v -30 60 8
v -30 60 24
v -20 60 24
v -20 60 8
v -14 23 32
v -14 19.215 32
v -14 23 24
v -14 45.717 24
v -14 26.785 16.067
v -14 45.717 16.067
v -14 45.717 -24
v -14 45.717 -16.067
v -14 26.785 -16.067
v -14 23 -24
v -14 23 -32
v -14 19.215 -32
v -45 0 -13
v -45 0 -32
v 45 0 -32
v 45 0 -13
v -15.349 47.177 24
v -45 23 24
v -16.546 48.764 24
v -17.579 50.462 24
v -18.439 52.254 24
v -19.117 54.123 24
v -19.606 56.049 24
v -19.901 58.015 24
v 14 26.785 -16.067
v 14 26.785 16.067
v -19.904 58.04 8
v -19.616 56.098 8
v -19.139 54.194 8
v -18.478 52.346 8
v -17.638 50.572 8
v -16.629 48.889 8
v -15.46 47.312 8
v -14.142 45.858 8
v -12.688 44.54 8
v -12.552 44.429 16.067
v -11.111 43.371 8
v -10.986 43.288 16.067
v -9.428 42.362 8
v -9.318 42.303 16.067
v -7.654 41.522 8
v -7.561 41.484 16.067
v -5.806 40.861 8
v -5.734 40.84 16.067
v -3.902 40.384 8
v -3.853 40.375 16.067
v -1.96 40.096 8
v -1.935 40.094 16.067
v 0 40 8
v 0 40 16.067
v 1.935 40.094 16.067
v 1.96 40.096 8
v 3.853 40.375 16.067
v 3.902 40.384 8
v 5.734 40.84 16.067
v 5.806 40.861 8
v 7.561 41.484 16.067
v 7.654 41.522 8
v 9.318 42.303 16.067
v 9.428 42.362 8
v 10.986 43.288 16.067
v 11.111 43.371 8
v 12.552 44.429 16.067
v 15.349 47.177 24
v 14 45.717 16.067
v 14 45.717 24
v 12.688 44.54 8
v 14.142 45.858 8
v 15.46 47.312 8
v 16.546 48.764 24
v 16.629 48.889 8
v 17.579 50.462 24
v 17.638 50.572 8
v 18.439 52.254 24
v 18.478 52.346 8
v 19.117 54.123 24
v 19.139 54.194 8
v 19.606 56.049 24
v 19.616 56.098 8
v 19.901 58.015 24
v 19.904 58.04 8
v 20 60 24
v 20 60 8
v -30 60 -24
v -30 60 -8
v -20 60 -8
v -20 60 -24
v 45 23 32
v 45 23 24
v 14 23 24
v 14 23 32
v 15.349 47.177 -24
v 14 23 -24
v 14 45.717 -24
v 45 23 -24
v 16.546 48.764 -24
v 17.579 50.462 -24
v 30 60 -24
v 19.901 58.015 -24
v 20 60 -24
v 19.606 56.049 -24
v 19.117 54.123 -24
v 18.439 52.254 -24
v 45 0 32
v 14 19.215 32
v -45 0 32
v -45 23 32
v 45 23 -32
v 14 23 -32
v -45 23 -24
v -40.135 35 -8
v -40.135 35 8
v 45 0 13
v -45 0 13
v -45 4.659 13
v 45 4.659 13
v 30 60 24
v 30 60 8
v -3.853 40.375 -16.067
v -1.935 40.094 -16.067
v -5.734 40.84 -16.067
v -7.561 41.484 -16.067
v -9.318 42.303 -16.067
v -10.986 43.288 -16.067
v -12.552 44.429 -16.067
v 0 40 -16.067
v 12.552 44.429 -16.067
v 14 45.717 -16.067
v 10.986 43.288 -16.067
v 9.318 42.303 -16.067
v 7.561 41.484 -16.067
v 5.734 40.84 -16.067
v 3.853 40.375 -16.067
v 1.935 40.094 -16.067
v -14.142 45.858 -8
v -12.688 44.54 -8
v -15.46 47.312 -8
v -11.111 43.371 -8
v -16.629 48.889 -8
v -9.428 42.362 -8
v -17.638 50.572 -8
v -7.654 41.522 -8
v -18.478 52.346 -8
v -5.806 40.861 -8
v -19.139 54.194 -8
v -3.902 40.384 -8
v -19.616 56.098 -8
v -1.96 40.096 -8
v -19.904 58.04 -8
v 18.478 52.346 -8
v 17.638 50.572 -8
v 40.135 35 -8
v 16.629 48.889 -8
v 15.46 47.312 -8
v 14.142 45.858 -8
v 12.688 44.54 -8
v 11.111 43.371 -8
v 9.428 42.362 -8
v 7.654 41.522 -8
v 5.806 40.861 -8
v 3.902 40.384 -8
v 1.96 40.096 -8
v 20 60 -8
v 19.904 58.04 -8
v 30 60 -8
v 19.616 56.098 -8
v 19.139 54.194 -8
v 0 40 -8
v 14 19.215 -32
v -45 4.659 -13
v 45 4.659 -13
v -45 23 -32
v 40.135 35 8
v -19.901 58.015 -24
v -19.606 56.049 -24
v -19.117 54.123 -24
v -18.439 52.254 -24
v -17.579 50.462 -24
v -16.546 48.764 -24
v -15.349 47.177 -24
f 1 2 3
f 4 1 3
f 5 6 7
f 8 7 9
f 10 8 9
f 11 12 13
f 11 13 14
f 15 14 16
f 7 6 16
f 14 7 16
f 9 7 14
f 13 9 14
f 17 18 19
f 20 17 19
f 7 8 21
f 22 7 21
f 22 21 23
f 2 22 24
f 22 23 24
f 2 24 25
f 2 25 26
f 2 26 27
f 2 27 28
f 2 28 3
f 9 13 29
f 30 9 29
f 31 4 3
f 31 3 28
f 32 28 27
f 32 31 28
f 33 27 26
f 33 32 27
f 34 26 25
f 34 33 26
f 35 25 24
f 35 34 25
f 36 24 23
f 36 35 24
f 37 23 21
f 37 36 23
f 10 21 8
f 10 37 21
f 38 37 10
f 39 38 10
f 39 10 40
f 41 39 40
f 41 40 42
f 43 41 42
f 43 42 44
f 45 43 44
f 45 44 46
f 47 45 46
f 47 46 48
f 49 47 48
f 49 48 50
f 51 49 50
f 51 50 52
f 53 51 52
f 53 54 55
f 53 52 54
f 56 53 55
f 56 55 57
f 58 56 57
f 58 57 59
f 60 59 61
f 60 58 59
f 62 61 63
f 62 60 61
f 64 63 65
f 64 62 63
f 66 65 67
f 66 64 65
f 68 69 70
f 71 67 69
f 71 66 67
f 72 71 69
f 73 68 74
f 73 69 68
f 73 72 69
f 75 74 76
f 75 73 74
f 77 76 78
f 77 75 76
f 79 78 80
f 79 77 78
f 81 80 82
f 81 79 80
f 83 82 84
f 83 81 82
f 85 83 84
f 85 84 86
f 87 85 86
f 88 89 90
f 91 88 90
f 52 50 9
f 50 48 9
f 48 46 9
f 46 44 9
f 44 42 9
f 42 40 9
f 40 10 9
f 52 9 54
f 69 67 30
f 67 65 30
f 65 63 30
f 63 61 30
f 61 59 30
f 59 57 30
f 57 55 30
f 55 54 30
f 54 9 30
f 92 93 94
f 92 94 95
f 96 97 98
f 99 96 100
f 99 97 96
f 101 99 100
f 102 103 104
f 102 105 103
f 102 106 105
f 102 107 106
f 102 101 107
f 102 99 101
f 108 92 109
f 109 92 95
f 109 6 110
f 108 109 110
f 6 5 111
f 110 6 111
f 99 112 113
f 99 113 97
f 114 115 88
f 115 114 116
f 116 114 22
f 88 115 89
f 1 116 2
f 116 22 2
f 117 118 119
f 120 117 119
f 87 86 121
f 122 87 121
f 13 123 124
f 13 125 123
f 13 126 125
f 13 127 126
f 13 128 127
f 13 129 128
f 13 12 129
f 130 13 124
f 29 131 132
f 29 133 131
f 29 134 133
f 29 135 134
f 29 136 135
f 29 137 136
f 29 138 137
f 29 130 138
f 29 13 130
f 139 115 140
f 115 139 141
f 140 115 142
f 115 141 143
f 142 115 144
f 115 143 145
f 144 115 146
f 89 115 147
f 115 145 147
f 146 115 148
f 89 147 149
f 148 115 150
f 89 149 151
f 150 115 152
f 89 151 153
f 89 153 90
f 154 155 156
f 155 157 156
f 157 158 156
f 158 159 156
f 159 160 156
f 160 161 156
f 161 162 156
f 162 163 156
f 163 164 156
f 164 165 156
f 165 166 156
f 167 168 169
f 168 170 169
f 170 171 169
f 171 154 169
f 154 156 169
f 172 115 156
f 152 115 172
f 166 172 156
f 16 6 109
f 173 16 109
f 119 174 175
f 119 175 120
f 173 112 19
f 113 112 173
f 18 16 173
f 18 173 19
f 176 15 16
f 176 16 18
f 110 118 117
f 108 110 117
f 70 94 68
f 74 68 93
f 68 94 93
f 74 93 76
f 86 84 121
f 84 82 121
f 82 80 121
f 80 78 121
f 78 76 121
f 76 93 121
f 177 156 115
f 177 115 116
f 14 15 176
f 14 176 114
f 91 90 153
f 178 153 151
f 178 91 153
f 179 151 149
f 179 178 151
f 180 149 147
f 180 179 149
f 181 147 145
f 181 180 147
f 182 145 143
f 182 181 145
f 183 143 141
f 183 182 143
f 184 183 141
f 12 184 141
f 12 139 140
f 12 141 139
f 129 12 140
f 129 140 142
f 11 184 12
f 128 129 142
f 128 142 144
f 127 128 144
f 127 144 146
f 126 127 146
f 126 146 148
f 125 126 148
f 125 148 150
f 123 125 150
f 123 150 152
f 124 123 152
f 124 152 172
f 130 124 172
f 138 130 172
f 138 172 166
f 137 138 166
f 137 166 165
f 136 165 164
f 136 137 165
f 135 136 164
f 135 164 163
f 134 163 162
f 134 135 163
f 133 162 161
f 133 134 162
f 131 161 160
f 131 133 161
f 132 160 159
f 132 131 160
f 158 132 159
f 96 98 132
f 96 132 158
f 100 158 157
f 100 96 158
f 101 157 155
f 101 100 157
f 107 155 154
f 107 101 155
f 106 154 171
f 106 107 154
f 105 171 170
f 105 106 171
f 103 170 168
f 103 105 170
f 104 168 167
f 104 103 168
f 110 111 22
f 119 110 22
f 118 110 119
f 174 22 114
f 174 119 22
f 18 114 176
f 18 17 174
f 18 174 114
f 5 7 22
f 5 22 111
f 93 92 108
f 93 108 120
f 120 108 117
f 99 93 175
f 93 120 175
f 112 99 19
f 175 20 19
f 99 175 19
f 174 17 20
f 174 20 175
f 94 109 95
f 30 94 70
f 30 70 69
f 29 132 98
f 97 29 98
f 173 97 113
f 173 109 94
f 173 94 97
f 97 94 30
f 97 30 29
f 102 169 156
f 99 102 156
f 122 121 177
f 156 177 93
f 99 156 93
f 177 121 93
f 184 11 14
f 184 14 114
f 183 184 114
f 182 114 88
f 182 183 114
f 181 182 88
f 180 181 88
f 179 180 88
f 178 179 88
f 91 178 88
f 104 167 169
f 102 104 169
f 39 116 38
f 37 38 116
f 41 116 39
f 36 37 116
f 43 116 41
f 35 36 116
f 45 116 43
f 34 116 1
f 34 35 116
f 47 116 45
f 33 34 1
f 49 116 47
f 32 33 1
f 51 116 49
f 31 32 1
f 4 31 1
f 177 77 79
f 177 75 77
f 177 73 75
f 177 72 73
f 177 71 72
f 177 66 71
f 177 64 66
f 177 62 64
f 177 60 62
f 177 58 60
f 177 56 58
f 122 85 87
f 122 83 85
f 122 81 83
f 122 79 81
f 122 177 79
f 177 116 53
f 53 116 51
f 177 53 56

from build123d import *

# Parameters (mm, degrees)
SKETCH1_W               = 90
SKETCH1_H               = 64
BOSS_EXTRUDE1_DEPTH     = 23
SKETCH3_W               = 26
SKETCH3_H               = 9.317565448
CUT_EXTRUDE1_DEPTH      = 99.249681933
SKETCH4_W               = 28
SKETCH4_H               = 7.570604484
CUT_EXTRUDE2_DEPTH      = 82.547532152
BOSS_EXTRUDE2_DEPTH     = 64
CUT_EXTRUDE3_DEPTH      = 113.800709218
CUT_EXTRUDE3_DEPTH_BACK = 113.800709218
SKETCH7_W               = 8
SKETCH7_H               = 37
CUT_EXTRUDE4_DEPTH      = 113.800709218
CUT_EXTRUDE4_DEPTH_BACK = 113.800709218
SKETCH8_W               = 16
SKETCH8_H               = 25
CUT_EXTRUDE5_DEPTH      = 94.600213675
CUT_EXTRUDE5_DEPTH_BACK = 94.600213675
SKETCH9_R               = 20
SKETCH11_W              = 28
SKETCH11_H              = 15.933340455
CUT_EXTRUDE6_DEPTH      = 69.647220475


with BuildPart() as part:
    # Sketch1 → Boss-Extrude1 (new body)
    with BuildSketch(Plane(origin=(0, 0, 0), x_dir=(1, 0, 0), z_dir=(0, 1, 0))):
        Rectangle(SKETCH1_W, SKETCH1_H)
    extrude(amount=BOSS_EXTRUDE1_DEPTH)

    # Sketch3 → Cut-Extrude1 (cut, through all)
    with BuildSketch(Plane.ZY.offset(45)):
        Rectangle(SKETCH3_W, SKETCH3_H)
    extrude(amount=-CUT_EXTRUDE1_DEPTH, mode=Mode.SUBTRACT)

    # Sketch4 → Cut-Extrude2 (cut, through all)
    with BuildSketch(Plane.XY.offset(32)):
        with Locations((0, 23)):
            Rectangle(SKETCH4_W, SKETCH4_H)
    cut_extrude2 = extrude(amount=-CUT_EXTRUDE2_DEPTH, mode=Mode.SUBTRACT)

    # Sketch5 → Boss-Extrude2 (add, through all)
    with BuildSketch(Plane.XY.offset(32)):
        Polygon((-30, 60), (30, 60), (45, 23), (-45, 23), align=None)
    extrude(amount=-BOSS_EXTRUDE2_DEPTH)

    # Sketch7 → Cut-Extrude3 (cut, two sides: drawn at the far end of the back side and taken through both)
    with BuildSketch(Plane.ZY.offset(45).offset(-CUT_EXTRUDE3_DEPTH_BACK)):
        with Locations((-28, 41.5)):
            Rectangle(SKETCH7_W, SKETCH7_H)
        with Locations((28, 41.5)):
            Rectangle(SKETCH7_W, SKETCH7_H)
    extrude(amount=CUT_EXTRUDE3_DEPTH + CUT_EXTRUDE3_DEPTH_BACK, mode=Mode.SUBTRACT)

    # Sketch8 → Cut-Extrude4 (cut, two sides: drawn at the far end of the back side and taken through both)
    with BuildSketch(Plane.ZY.offset(45).offset(-CUT_EXTRUDE4_DEPTH_BACK)):
        with Locations((0, 47.5)):
            Rectangle(SKETCH8_W, SKETCH8_H)
    extrude(amount=CUT_EXTRUDE4_DEPTH + CUT_EXTRUDE4_DEPTH_BACK, mode=Mode.SUBTRACT)

    # Sketch9 → Cut-Extrude5 (cut, two sides: drawn at the far end of the back side and taken through both)
    with BuildSketch(Plane.XY.offset(24).offset(-CUT_EXTRUDE5_DEPTH_BACK)):
        with Locations((0, 60)):
            Circle(SKETCH9_R)
    extrude(amount=CUT_EXTRUDE5_DEPTH + CUT_EXTRUDE5_DEPTH_BACK, mode=Mode.SUBTRACT)

    # Sketch11 → Cut-Extrude6 (cut, through all)
    with BuildSketch(Plane(origin=(0, 19.214697758, 0), x_dir=(1, 0, 0), z_dir=(0, 1, 0))):
        with Locations((0, -24.033329773)):
            Rectangle(SKETCH11_W, SKETCH11_H)
    cut_extrude6 = extrude(amount=CUT_EXTRUDE6_DEPTH, mode=Mode.SUBTRACT)

    # Mirror1: Cut-Extrude2, Cut-Extrude6 across plane
    add(cut_extrude2.mirror(Plane.XY), mode=Mode.SUBTRACT)
    add(cut_extrude6.mirror(Plane.XY), mode=Mode.SUBTRACT)


solid = part.part
